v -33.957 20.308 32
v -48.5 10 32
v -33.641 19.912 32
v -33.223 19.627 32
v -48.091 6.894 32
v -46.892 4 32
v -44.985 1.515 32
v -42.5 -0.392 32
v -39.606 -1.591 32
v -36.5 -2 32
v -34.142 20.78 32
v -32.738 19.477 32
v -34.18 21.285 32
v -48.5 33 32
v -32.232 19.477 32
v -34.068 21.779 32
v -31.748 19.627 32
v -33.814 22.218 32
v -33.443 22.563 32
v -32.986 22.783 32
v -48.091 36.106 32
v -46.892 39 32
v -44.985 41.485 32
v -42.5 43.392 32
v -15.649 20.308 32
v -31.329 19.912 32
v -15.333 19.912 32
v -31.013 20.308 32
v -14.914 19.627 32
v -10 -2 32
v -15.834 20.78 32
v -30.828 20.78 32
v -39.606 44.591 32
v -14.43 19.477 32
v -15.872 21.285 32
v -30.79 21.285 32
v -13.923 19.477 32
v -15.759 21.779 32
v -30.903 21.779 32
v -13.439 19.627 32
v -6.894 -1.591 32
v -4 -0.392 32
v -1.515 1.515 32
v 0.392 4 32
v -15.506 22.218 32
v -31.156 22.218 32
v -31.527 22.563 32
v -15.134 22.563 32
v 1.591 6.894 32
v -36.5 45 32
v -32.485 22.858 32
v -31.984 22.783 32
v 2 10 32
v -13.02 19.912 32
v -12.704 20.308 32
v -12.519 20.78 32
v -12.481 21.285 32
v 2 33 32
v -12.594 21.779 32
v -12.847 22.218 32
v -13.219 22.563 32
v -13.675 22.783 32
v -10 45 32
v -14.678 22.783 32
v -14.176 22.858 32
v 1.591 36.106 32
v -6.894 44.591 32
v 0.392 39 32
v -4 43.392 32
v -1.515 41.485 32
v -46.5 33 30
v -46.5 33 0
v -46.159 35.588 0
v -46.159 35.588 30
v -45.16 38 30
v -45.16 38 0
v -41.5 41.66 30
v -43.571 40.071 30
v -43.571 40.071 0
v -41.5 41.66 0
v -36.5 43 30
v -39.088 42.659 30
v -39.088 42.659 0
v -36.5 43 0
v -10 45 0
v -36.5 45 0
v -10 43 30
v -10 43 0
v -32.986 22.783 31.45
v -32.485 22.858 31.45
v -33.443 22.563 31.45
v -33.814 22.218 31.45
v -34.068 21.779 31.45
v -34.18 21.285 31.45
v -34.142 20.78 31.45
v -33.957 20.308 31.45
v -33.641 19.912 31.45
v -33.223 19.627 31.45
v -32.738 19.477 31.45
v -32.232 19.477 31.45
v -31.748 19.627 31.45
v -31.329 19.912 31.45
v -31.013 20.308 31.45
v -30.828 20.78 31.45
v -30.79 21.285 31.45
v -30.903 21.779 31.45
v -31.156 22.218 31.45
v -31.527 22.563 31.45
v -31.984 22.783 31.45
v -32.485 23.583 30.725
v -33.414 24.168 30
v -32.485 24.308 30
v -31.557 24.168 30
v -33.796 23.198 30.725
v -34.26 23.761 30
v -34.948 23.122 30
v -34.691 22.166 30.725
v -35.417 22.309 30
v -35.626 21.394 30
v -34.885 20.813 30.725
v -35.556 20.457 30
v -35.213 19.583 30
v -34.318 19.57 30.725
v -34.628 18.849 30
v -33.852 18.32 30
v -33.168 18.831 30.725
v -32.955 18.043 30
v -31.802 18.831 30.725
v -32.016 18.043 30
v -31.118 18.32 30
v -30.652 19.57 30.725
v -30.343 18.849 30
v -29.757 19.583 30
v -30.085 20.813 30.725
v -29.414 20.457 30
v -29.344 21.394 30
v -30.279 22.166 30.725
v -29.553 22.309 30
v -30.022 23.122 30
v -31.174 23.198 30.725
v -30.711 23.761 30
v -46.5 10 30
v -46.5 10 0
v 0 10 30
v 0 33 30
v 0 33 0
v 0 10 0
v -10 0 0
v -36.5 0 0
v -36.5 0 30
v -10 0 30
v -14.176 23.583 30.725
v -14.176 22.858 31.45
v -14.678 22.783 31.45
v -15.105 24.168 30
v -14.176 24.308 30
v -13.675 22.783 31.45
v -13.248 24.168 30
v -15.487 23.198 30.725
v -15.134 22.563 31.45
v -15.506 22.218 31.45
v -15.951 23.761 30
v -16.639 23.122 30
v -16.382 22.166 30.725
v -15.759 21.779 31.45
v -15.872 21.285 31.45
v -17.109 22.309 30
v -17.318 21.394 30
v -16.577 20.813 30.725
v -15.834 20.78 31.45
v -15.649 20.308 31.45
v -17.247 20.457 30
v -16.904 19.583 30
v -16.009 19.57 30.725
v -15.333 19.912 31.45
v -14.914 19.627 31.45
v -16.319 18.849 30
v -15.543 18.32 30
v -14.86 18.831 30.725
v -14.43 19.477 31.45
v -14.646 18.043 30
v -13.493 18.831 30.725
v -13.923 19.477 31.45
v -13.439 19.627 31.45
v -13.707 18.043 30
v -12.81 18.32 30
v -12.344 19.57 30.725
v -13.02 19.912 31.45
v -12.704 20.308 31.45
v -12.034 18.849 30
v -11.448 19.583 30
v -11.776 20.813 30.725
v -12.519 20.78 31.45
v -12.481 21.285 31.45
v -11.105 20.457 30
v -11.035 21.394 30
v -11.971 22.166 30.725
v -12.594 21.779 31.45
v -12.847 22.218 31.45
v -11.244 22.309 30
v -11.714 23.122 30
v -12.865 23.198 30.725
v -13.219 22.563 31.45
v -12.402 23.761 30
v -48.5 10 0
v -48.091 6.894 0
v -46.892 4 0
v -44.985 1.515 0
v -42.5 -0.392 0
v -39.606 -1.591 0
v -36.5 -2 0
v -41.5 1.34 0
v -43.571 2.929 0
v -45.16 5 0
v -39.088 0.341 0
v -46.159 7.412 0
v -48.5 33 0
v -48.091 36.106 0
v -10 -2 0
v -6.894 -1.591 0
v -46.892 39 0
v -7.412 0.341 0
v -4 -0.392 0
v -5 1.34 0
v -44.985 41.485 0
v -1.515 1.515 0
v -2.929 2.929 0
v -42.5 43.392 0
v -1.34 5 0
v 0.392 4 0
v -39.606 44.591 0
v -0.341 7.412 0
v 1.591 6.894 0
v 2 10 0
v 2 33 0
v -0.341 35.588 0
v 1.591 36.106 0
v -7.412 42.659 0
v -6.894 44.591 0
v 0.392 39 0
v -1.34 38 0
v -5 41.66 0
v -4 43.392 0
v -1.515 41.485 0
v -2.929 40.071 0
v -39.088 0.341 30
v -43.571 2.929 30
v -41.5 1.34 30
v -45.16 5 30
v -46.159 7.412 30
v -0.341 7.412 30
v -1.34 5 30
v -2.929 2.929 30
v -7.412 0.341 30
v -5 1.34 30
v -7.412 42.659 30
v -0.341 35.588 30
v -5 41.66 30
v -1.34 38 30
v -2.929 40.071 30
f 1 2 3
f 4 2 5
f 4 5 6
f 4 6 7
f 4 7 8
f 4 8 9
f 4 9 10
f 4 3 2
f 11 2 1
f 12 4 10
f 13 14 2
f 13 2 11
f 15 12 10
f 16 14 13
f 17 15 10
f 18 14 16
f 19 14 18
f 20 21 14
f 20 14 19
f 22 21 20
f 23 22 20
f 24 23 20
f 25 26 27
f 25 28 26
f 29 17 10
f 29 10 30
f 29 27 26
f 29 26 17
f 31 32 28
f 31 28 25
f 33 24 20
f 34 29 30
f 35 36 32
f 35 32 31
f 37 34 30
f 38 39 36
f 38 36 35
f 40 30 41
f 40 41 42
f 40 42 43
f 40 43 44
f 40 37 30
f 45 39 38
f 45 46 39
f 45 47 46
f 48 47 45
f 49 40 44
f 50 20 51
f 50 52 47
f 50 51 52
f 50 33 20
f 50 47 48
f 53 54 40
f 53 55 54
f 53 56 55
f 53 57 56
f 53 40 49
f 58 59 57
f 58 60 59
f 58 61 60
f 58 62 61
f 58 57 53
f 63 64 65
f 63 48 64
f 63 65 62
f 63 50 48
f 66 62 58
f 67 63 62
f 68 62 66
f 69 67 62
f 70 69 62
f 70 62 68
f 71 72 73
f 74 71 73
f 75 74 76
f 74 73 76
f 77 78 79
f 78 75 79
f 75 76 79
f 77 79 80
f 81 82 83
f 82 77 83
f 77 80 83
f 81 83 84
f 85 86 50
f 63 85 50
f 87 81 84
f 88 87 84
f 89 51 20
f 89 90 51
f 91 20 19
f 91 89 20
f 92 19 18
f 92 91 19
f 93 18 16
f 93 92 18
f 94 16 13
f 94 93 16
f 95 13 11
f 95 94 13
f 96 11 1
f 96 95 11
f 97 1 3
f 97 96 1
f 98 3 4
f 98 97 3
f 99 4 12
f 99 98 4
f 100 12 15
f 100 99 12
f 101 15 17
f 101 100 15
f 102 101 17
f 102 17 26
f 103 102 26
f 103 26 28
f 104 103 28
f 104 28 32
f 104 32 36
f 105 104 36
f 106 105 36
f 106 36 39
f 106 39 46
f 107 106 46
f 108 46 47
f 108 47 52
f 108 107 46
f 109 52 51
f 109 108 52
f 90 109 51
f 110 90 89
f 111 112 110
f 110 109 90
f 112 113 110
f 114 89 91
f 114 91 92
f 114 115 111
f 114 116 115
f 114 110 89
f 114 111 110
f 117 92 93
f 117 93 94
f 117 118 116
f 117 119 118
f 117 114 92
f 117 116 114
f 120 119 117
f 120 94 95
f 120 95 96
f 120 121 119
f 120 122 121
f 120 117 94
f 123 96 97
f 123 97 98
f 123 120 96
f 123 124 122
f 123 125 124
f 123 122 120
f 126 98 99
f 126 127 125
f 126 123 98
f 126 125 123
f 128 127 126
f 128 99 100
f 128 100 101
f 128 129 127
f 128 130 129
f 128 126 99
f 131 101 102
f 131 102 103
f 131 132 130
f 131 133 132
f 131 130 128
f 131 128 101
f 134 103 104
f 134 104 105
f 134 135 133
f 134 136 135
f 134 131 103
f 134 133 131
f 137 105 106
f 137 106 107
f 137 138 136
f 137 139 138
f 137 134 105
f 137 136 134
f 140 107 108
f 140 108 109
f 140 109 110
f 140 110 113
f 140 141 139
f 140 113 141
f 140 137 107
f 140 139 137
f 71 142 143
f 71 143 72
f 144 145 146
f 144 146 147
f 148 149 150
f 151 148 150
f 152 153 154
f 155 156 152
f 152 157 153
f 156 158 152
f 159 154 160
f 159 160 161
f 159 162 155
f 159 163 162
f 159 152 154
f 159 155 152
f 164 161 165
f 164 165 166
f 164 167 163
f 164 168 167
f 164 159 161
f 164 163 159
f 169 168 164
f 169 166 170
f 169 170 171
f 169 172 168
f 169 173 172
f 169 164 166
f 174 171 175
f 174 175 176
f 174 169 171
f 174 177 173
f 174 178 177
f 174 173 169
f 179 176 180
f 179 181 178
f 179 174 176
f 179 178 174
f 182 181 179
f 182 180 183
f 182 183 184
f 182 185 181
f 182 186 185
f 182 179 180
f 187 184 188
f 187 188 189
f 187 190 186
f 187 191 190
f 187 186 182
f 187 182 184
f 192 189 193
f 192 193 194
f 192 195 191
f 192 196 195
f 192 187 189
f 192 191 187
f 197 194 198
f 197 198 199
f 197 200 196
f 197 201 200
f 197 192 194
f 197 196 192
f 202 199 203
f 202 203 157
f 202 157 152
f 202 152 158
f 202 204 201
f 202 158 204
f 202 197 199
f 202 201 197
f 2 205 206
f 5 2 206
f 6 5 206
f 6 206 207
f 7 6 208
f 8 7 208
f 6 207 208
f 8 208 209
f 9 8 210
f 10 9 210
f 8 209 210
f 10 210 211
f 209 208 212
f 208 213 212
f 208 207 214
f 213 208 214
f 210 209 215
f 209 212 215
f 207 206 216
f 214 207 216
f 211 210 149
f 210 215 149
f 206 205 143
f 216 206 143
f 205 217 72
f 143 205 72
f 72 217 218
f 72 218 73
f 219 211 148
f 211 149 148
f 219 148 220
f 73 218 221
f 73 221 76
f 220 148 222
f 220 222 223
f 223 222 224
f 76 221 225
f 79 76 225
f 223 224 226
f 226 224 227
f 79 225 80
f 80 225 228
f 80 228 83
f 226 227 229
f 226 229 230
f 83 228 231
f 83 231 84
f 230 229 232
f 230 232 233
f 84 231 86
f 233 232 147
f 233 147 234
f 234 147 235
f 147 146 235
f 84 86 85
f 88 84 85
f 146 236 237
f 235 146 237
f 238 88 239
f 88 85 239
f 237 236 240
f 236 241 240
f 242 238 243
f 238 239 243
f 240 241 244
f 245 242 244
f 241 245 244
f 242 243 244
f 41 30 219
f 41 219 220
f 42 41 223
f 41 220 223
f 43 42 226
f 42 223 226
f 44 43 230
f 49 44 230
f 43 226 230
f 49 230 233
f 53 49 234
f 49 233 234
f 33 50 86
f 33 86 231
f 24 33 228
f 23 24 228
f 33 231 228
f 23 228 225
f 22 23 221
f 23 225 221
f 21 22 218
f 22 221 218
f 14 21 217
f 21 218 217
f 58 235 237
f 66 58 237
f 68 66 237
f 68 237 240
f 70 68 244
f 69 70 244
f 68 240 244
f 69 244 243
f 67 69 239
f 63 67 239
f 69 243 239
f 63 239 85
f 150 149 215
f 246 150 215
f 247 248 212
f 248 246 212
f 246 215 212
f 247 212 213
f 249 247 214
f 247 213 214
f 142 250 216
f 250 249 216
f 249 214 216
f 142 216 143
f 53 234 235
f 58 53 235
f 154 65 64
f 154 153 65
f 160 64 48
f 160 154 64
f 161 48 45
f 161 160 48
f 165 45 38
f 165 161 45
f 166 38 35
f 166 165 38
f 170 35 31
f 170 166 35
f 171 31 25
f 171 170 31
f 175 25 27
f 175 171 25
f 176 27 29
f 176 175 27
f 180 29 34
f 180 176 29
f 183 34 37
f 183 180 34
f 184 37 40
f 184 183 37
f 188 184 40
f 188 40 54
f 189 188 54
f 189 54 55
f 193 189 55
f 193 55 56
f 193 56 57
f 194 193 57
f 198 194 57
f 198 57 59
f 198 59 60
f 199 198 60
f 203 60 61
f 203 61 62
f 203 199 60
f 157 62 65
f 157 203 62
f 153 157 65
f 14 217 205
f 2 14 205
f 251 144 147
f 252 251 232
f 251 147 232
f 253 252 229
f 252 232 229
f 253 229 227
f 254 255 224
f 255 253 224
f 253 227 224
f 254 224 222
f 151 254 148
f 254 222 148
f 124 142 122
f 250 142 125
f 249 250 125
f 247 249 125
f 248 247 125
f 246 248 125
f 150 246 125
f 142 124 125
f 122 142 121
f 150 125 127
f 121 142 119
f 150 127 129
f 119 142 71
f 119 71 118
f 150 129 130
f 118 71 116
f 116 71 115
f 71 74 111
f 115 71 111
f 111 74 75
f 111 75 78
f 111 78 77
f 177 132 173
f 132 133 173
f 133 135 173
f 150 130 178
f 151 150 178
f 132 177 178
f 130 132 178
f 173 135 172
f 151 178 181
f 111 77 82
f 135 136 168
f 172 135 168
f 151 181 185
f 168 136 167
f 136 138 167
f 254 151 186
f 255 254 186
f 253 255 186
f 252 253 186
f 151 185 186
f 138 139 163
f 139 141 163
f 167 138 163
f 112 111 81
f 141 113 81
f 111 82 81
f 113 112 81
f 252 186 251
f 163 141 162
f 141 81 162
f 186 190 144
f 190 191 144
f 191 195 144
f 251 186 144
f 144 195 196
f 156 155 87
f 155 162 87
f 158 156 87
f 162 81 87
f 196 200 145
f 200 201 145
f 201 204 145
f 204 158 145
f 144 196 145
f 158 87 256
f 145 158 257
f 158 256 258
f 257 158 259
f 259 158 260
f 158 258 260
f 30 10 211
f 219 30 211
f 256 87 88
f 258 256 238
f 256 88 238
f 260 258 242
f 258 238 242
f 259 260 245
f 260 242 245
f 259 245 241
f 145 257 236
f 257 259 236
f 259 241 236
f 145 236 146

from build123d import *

# Parameters (mm, degrees)
RESSALTO_EXTRUS_O1_DEPTH                     = 30
CASCA1_START                                 = -36.5
CASCA1_OUTLINE_W                             = 43
CASCA1_OUTLINE_H                             = 30
CASCA1_DEPTH                                 = 26.5
CASCA1_2_DEPTH                               = 26.5
CASCA1_3_DEPTH                               = 30
CASCA1_4_DEPTH                               = 32
CASCA1_START_2                               = 30
CASCA1_5_DEPTH                               = 2
ESCAREADO_PARA_PARAFUSO_COM_CABE_A_E_2_COUNT = 2
ESCAREADO_PARA_PARAFUSO_COM_CABE_A_E_2_PITCH = 18.308687804


with BuildPart() as part:
    # Esboço1 → Ressalto-extrusão1 (new body)
    with BuildSketch(Plane.XY):
        with BuildLine():
            Line((-10, 0), (-36.5, 0))
            ThreePointArc((-36.5, 0), (-43.571067812, 2.928932188), (-46.5, 10))
            Line((-46.5, 10), (-46.5, 33))
            ThreePointArc((-46.5, 33), (-43.571067812, 40.071067812), (-36.5, 43))
            Line((-36.5, 43), (-10, 43))
            ThreePointArc((-10, 43), (-2.928932188, 40.071067812), (0, 33))
            Line((0, 33), (0, 10))
            ThreePointArc((0, 10), (-2.928932188, 2.928932188), (-10, 0))
        make_face()
    extrude(amount=RESSALTO_EXTRUS_O1_DEPTH)

    # Casca1: read off the stored shape, not the designer's step
    # Casca1 outline → Casca1 (cut)
    with BuildSketch(Plane.YZ.offset(CASCA1_START)):
        with Locations((21.5, 15)):
            Rectangle(CASCA1_OUTLINE_W, CASCA1_OUTLINE_H)
    extrude(amount=CASCA1_DEPTH, mode=Mode.SUBTRACT)

    # Casca1 2 outline → Casca1 2 (add)
    with BuildSketch(Plane.YZ.offset(CASCA1_START)):
        Polygon((-2, 32), (-2, 0), (0, 0), (0, 30), (43, 30), (43, 0), (45, 0), (45, 32), align=None)
    extrude(amount=CASCA1_2_DEPTH)

    # Casca1 3 outline → Casca1 3 (cut)
    with BuildSketch(Plane.XY):
        with BuildLine():
            Line((-36.5, 0), (-36.5, 43))
            ThreePointArc((-36.5, 43), (-43.571067812, 40.071067812), (-46.5, 33))
            Line((-46.5, 33), (-46.5, 10))
            ThreePointArc((-46.5, 10), (-43.571067812, 2.928932188), (-36.5, 0))
        make_face()
        with BuildLine():
            Line((-10, 43), (-10, 0))
            ThreePointArc((-10, 0), (-2.928932188, 2.928932188), (0, 10))
            Line((0, 10), (0, 33))
            ThreePointArc((0, 33), (-2.928932188, 40.071067812), (-10, 43))
        make_face()
    extrude(amount=CASCA1_3_DEPTH, mode=Mode.SUBTRACT)

    # Casca1 4 outline → Casca1 4 (add)
    with BuildSketch(Plane.XY):
        with BuildLine():
            ThreePointArc((-36.5, 45), (-44.985281374, 41.485281374), (-48.5, 33))
            Line((-48.5, 33), (-48.5, 10))
            ThreePointArc((-48.5, 10), (-44.985281374, 1.514718626), (-36.5, -2))
            Line((-36.5, -2), (-36.5, 0))
            ThreePointArc((-36.5, 0), (-43.571067812, 2.928932188), (-46.5, 10))
            Line((-46.5, 10), (-46.5, 33))
            ThreePointArc((-46.5, 33), (-43.571067812, 40.071067812), (-36.5, 43))
            Line((-36.5, 43), (-36.5, 45))
        make_face()
        with BuildLine():
            ThreePointArc((-10, -2), (-1.514718626, 1.514718626), (2, 10))
            Line((2, 10), (2, 33))
            ThreePointArc((2, 33), (-1.514718626, 41.485281374), (-10, 45))
            Line((-10, 45), (-10, 43))
            ThreePointArc((-10, 43), (-2.928932188, 40.071067812), (0, 33))
            Line((0, 33), (0, 10))
            ThreePointArc((0, 10), (-2.928932188, 2.928932188), (-10, 0))
            Line((-10, 0), (-10, -2))
        make_face()
    extrude(amount=CASCA1_4_DEPTH)

    # Casca1 5 outline → Casca1 5 (add)
    with BuildSketch(Plane.XY.offset(CASCA1_START_2)):
        with BuildLine():
            Line((-36.5, 0), (-36.5, 43))
            ThreePointArc((-36.5, 43), (-43.571067812, 40.071067812), (-46.5, 33))
            Line((-46.5, 33), (-46.5, 10))
            ThreePointArc((-46.5, 10), (-43.571067812, 2.928932188), (-36.5, 0))
        make_face()
        with BuildLine():
            Line((-10, 43), (-10, 0))
            ThreePointArc((-10, 0), (-2.928932188, 2.928932188), (0, 10))
            Line((0, 10), (0, 33))
            ThreePointArc((0, 33), (-2.928932188, 40.071067812), (-10, 43))
        make_face()
    extrude(amount=CASCA1_5_DEPTH)

    # Esboço4 → Escareado para parafuso com cabeça escareada chata de M31 (revolve, cut)
    with BuildSketch(Plane(origin=(-32.48511858, 21.158156033, 30), x_dir=(0, 1, 0), z_dir=(1, 0, 0))):
        Polygon((0, 0), (0, 2), (1.7, 2), (1.7, 1.45), (3.15, 0), align=None)
    escareado_para_parafuso_com_cabe_a_escar = revolve(axis=Axis((-32.48511858, 21.158156033, 23.65), (0, 0, 1)), mode=Mode.SUBTRACT)

    # Escareado para parafuso com cabe_a e 2: Escareado para parafuso com cabeça escareada chata de M31 ×2
    with Locations(*[(i * ESCAREADO_PARA_PARAFUSO_COM_CABE_A_E_2_PITCH, 0, 0) for i in range(1, ESCAREADO_PARA_PARAFUSO_COM_CABE_A_E_2_COUNT)]):
        add(escareado_para_parafuso_com_cabe_a_escar, mode=Mode.SUBTRACT)


solid = part.part
